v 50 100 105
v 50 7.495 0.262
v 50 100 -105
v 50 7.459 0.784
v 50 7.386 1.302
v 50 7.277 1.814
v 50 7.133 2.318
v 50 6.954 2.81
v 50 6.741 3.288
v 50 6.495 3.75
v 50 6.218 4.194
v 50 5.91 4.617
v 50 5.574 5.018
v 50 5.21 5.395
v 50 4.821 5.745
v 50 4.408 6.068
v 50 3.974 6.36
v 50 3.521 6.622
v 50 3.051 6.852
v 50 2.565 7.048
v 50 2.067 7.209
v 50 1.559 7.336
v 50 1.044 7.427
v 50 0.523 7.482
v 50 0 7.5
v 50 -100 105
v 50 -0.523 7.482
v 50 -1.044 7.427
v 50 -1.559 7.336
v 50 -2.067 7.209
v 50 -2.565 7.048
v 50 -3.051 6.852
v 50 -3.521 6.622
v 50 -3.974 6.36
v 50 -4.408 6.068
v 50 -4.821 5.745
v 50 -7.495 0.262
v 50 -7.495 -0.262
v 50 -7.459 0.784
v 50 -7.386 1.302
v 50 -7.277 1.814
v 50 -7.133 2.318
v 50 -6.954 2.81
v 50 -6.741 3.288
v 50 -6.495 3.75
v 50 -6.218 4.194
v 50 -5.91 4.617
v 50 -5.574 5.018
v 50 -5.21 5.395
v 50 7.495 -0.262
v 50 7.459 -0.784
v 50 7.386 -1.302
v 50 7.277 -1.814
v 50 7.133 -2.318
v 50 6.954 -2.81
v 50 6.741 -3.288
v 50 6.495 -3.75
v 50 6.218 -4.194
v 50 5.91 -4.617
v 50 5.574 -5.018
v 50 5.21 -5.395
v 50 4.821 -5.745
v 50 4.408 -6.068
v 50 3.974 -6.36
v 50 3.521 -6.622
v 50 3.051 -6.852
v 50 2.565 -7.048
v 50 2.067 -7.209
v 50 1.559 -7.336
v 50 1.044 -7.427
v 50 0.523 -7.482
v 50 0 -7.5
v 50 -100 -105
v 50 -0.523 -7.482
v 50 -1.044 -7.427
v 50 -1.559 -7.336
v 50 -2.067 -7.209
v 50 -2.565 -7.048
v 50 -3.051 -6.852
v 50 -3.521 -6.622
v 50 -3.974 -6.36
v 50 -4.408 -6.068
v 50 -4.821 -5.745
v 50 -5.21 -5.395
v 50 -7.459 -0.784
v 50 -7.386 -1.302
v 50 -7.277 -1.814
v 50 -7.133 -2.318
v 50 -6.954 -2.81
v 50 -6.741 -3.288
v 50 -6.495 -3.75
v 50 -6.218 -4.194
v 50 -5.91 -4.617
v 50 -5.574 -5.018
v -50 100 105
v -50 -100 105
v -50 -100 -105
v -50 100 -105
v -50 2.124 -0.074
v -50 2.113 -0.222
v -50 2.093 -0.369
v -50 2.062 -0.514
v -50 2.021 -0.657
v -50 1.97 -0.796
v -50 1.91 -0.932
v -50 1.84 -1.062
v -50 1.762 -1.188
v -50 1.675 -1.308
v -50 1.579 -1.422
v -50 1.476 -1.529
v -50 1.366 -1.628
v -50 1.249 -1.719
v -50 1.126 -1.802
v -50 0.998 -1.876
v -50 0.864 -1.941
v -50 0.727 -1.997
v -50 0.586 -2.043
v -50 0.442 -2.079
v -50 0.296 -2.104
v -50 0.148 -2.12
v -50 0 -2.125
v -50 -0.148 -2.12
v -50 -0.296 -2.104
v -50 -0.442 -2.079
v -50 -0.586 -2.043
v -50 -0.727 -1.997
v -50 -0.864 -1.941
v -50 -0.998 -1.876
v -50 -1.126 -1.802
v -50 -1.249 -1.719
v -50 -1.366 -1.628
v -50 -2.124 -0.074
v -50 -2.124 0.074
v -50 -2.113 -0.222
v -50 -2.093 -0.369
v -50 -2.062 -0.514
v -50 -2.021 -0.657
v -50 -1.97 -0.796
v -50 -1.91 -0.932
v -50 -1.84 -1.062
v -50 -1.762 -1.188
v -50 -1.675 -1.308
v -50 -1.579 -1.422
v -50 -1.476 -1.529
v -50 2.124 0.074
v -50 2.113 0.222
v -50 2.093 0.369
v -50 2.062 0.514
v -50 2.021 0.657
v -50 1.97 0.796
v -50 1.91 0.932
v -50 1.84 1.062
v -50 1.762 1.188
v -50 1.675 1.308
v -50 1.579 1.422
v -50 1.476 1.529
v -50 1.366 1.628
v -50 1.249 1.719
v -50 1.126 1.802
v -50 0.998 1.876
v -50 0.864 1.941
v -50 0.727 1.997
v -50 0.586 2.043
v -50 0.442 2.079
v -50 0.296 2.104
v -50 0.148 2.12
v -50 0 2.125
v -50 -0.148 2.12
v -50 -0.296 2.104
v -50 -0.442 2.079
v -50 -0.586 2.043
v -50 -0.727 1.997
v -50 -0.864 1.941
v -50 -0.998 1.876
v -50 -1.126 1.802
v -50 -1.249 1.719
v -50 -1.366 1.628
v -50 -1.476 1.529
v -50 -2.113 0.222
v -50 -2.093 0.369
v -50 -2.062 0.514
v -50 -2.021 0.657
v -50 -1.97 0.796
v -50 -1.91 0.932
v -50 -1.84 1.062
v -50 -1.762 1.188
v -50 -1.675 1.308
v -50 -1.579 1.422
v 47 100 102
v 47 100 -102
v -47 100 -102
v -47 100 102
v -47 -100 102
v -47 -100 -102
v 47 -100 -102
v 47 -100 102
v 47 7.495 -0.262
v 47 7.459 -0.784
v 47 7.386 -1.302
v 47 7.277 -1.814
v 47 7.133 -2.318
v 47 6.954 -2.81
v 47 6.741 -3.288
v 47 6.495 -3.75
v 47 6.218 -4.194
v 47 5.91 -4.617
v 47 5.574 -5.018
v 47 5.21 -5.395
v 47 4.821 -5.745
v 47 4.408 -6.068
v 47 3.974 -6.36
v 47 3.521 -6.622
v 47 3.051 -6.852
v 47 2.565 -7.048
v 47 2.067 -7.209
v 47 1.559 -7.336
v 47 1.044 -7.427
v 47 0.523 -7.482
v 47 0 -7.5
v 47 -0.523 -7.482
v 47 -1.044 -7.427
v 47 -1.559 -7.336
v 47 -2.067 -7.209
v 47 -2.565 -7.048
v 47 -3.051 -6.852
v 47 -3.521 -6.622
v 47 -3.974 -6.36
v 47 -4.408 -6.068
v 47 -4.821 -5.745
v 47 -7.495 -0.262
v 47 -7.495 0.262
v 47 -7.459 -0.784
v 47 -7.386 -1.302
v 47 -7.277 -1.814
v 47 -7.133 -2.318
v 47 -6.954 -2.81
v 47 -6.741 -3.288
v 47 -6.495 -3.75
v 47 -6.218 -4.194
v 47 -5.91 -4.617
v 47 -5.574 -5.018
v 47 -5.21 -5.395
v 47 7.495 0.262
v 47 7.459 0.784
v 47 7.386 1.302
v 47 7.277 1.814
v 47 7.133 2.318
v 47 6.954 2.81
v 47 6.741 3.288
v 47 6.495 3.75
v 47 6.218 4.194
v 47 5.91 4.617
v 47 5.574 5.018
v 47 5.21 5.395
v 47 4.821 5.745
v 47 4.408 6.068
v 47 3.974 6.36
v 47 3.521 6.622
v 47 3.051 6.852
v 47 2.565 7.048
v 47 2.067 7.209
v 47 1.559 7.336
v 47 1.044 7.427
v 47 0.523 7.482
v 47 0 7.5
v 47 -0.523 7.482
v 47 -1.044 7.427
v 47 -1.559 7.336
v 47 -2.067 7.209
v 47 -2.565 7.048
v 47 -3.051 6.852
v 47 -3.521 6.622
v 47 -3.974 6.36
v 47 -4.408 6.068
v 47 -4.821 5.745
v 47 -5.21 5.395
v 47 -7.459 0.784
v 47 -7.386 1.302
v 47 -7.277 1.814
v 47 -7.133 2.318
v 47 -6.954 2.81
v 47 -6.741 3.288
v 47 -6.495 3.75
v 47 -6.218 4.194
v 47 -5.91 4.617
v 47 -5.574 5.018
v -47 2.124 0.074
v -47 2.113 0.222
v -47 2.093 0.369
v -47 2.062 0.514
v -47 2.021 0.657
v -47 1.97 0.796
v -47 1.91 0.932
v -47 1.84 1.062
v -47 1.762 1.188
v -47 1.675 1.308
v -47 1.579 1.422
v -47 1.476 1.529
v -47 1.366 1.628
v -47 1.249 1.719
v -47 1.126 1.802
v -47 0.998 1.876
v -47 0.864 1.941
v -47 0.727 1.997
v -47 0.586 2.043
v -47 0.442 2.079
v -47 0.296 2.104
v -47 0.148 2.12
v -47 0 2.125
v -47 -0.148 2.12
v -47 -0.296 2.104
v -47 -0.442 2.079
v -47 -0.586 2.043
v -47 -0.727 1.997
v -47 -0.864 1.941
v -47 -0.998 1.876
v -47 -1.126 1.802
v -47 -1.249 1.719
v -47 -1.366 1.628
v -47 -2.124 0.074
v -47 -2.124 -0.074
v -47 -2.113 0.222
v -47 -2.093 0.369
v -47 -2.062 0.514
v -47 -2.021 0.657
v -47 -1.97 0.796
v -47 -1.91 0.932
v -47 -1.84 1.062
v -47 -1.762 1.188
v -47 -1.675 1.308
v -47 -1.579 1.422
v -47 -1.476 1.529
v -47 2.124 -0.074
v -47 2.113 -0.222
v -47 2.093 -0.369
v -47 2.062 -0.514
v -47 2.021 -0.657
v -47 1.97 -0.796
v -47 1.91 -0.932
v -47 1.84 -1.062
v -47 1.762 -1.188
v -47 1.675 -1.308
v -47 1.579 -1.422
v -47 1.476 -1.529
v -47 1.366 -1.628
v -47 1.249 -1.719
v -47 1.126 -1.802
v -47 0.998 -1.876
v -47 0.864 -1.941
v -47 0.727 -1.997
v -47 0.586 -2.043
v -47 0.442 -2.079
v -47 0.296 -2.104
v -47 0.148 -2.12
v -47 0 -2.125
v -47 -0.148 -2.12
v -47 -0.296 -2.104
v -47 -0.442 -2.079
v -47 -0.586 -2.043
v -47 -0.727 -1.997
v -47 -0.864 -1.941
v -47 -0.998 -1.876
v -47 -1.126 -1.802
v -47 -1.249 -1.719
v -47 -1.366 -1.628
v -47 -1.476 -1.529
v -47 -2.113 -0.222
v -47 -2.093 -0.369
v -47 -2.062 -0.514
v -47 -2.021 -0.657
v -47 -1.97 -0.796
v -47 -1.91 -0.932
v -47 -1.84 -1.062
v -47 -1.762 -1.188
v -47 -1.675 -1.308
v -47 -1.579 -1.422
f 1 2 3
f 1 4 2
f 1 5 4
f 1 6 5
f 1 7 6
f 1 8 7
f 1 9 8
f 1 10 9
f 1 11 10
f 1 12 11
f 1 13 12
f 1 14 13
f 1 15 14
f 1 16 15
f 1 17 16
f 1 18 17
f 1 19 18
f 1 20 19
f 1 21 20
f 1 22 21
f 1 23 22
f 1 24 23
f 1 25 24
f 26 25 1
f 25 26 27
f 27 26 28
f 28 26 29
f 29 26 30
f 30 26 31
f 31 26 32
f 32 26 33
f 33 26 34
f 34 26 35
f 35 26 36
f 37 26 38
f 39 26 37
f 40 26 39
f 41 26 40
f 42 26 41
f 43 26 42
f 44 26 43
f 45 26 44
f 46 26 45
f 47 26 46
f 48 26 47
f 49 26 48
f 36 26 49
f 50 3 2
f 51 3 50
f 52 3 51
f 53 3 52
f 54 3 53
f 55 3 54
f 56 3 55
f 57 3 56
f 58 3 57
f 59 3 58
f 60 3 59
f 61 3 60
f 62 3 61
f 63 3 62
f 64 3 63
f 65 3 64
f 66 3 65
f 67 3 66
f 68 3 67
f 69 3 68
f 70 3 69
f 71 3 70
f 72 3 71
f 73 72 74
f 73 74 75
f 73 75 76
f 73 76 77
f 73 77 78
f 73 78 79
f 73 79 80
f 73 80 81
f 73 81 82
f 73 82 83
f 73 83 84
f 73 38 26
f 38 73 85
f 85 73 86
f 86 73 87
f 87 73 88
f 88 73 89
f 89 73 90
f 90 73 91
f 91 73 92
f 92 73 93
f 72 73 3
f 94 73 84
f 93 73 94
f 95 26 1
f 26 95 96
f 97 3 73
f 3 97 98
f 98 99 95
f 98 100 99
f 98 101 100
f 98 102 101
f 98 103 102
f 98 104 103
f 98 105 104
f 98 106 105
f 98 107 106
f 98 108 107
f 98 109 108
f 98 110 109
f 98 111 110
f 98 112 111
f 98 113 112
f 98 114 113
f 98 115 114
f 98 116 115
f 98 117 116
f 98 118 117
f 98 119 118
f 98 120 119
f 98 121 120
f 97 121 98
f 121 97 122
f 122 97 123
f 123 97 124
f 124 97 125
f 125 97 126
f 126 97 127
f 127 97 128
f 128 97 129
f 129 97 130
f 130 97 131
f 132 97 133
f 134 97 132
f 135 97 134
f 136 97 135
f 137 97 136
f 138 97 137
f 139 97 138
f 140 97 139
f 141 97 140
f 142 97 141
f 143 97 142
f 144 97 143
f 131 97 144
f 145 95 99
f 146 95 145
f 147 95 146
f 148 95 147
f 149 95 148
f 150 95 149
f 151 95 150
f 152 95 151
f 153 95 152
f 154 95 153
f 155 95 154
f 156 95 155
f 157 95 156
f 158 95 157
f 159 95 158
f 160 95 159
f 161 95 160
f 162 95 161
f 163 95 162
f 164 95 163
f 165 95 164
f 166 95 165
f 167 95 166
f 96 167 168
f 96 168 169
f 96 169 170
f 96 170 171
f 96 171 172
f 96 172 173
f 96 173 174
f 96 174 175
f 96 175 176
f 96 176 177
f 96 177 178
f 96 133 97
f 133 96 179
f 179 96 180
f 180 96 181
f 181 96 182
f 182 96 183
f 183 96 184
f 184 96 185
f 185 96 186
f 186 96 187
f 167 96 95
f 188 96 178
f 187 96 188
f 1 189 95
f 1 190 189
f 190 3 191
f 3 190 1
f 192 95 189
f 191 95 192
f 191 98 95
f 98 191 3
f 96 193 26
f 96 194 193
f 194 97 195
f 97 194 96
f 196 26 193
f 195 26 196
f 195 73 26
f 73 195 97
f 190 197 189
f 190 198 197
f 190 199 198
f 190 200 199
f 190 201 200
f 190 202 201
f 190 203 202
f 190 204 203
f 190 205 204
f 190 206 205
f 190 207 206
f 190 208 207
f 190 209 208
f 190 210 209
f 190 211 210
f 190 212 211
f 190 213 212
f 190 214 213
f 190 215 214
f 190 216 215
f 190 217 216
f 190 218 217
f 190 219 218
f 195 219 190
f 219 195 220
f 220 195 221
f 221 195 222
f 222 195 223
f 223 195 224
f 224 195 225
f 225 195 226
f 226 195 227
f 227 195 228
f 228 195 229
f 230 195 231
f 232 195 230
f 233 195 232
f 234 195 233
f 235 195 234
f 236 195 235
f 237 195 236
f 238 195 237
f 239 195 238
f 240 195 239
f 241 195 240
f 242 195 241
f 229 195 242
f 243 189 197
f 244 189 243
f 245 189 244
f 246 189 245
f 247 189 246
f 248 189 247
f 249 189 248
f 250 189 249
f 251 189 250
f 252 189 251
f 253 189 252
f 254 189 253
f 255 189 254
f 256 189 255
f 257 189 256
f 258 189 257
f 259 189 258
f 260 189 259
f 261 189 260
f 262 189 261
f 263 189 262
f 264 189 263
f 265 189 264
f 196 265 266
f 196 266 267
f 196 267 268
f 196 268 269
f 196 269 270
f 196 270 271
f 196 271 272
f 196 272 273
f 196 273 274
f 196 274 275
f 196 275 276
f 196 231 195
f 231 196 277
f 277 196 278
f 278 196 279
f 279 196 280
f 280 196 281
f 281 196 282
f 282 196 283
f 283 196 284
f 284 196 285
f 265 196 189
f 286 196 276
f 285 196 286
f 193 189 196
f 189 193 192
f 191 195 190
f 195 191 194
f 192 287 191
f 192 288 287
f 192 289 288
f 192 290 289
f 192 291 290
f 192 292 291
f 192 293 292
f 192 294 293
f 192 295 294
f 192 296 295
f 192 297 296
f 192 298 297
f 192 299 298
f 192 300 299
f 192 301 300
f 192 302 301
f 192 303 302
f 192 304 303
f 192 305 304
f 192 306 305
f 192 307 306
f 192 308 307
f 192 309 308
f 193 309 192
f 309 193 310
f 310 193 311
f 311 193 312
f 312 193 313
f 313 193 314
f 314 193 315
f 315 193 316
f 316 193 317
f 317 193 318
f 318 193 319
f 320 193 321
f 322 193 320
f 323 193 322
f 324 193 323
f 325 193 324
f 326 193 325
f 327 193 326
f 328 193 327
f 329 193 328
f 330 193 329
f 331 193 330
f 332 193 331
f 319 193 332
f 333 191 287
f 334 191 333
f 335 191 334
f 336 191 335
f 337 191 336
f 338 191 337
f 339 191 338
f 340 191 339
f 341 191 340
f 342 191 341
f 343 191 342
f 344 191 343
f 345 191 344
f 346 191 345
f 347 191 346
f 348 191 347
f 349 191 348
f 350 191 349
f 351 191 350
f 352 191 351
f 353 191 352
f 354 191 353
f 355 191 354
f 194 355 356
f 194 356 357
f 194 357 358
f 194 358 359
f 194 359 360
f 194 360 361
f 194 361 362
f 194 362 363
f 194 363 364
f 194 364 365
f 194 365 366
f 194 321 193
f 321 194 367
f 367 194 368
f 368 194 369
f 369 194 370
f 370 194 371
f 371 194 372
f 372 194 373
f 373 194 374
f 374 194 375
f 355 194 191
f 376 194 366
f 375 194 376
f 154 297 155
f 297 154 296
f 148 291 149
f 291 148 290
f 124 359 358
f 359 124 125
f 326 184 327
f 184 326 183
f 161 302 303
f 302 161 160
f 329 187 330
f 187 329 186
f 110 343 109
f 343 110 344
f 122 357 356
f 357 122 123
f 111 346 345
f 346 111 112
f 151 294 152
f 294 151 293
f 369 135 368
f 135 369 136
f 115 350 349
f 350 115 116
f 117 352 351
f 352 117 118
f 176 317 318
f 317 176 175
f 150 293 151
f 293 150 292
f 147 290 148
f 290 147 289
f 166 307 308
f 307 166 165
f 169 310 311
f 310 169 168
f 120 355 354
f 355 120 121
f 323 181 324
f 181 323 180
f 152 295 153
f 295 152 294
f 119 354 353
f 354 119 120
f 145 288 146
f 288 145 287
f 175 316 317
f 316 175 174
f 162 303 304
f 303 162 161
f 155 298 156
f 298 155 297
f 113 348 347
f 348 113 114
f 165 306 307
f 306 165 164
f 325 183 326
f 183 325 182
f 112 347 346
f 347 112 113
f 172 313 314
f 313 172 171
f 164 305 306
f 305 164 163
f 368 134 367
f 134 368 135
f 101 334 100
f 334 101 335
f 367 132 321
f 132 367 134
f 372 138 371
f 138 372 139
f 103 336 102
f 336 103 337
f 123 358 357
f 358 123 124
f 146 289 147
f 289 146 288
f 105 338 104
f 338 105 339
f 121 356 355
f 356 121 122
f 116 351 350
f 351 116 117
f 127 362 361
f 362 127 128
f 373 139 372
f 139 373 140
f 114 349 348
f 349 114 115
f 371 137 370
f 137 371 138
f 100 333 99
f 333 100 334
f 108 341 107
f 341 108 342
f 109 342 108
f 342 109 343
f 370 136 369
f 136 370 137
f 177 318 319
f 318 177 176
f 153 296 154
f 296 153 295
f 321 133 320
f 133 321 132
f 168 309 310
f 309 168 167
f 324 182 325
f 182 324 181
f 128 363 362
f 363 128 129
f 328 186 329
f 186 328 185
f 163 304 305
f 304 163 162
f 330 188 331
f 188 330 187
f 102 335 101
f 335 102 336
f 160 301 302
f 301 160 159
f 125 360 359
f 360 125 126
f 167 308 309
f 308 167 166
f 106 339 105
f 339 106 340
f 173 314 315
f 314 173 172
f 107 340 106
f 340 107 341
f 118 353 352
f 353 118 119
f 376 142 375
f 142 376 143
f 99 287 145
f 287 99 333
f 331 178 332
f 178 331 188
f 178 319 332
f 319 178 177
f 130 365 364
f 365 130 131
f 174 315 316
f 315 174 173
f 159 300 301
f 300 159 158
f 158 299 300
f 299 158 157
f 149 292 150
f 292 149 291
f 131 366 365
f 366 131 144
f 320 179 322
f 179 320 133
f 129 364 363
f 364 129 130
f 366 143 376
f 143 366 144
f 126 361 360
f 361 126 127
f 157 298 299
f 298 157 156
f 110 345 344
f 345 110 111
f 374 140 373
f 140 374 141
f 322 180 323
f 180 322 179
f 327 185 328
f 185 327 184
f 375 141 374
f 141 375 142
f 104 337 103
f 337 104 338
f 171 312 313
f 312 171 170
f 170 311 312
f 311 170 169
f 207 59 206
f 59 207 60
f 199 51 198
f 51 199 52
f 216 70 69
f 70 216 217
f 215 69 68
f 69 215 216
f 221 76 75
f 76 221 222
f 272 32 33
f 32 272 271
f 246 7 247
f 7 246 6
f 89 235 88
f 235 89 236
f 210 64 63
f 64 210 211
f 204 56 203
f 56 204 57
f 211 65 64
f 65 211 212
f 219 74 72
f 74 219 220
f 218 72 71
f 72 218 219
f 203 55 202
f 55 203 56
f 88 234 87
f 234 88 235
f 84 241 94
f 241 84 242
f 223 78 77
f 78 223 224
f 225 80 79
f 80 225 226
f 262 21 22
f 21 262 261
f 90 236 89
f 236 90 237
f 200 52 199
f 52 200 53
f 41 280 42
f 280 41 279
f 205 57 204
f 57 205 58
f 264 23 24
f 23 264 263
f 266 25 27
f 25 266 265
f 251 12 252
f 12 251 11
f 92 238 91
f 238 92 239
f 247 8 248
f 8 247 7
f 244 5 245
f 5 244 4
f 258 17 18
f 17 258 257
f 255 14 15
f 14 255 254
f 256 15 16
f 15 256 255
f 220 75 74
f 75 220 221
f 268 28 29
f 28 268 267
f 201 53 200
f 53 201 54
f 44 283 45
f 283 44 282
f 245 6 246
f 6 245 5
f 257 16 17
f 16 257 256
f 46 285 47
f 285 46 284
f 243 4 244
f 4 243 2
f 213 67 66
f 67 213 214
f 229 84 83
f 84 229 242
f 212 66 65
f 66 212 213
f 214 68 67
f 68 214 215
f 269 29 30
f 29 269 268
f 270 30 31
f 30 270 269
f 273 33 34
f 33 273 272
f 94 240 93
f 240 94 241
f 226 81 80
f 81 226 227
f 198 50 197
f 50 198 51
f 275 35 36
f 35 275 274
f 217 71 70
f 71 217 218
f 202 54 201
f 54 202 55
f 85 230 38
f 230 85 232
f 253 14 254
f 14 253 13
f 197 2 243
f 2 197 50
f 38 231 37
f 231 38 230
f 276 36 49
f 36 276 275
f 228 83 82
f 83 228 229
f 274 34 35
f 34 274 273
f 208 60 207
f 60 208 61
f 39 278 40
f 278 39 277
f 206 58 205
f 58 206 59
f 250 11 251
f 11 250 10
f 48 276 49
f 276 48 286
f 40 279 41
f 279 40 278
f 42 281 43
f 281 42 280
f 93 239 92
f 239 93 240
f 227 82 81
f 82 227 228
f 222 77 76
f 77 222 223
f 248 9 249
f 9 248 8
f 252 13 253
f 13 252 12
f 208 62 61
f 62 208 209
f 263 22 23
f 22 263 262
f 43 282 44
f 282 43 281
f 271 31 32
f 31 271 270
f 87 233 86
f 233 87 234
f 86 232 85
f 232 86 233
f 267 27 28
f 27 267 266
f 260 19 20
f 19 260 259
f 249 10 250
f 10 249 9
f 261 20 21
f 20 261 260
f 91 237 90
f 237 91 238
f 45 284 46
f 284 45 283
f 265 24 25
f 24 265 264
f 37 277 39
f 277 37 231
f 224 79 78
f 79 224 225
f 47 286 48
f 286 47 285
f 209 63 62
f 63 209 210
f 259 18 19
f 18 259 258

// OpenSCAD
outer = [100, 200, 210];
wall = 3;
inner = [outer.x - (2*wall), outer.y*2, outer.z - (2*wall)];

$fn = 90;

difference() {
  cube(outer, center=true);
  cube(inner, center=true);

  #translate([outer.x/-2 - wall, 0, 0])
  rotate([0, 90, 0])
    cylinder(d=4.25, h=wall*3);


  #translate([outer.x/2, 0, 0])
  rotate([0, 90, 0])
    cylinder(d=15, h=wall*3, center=true);
}
